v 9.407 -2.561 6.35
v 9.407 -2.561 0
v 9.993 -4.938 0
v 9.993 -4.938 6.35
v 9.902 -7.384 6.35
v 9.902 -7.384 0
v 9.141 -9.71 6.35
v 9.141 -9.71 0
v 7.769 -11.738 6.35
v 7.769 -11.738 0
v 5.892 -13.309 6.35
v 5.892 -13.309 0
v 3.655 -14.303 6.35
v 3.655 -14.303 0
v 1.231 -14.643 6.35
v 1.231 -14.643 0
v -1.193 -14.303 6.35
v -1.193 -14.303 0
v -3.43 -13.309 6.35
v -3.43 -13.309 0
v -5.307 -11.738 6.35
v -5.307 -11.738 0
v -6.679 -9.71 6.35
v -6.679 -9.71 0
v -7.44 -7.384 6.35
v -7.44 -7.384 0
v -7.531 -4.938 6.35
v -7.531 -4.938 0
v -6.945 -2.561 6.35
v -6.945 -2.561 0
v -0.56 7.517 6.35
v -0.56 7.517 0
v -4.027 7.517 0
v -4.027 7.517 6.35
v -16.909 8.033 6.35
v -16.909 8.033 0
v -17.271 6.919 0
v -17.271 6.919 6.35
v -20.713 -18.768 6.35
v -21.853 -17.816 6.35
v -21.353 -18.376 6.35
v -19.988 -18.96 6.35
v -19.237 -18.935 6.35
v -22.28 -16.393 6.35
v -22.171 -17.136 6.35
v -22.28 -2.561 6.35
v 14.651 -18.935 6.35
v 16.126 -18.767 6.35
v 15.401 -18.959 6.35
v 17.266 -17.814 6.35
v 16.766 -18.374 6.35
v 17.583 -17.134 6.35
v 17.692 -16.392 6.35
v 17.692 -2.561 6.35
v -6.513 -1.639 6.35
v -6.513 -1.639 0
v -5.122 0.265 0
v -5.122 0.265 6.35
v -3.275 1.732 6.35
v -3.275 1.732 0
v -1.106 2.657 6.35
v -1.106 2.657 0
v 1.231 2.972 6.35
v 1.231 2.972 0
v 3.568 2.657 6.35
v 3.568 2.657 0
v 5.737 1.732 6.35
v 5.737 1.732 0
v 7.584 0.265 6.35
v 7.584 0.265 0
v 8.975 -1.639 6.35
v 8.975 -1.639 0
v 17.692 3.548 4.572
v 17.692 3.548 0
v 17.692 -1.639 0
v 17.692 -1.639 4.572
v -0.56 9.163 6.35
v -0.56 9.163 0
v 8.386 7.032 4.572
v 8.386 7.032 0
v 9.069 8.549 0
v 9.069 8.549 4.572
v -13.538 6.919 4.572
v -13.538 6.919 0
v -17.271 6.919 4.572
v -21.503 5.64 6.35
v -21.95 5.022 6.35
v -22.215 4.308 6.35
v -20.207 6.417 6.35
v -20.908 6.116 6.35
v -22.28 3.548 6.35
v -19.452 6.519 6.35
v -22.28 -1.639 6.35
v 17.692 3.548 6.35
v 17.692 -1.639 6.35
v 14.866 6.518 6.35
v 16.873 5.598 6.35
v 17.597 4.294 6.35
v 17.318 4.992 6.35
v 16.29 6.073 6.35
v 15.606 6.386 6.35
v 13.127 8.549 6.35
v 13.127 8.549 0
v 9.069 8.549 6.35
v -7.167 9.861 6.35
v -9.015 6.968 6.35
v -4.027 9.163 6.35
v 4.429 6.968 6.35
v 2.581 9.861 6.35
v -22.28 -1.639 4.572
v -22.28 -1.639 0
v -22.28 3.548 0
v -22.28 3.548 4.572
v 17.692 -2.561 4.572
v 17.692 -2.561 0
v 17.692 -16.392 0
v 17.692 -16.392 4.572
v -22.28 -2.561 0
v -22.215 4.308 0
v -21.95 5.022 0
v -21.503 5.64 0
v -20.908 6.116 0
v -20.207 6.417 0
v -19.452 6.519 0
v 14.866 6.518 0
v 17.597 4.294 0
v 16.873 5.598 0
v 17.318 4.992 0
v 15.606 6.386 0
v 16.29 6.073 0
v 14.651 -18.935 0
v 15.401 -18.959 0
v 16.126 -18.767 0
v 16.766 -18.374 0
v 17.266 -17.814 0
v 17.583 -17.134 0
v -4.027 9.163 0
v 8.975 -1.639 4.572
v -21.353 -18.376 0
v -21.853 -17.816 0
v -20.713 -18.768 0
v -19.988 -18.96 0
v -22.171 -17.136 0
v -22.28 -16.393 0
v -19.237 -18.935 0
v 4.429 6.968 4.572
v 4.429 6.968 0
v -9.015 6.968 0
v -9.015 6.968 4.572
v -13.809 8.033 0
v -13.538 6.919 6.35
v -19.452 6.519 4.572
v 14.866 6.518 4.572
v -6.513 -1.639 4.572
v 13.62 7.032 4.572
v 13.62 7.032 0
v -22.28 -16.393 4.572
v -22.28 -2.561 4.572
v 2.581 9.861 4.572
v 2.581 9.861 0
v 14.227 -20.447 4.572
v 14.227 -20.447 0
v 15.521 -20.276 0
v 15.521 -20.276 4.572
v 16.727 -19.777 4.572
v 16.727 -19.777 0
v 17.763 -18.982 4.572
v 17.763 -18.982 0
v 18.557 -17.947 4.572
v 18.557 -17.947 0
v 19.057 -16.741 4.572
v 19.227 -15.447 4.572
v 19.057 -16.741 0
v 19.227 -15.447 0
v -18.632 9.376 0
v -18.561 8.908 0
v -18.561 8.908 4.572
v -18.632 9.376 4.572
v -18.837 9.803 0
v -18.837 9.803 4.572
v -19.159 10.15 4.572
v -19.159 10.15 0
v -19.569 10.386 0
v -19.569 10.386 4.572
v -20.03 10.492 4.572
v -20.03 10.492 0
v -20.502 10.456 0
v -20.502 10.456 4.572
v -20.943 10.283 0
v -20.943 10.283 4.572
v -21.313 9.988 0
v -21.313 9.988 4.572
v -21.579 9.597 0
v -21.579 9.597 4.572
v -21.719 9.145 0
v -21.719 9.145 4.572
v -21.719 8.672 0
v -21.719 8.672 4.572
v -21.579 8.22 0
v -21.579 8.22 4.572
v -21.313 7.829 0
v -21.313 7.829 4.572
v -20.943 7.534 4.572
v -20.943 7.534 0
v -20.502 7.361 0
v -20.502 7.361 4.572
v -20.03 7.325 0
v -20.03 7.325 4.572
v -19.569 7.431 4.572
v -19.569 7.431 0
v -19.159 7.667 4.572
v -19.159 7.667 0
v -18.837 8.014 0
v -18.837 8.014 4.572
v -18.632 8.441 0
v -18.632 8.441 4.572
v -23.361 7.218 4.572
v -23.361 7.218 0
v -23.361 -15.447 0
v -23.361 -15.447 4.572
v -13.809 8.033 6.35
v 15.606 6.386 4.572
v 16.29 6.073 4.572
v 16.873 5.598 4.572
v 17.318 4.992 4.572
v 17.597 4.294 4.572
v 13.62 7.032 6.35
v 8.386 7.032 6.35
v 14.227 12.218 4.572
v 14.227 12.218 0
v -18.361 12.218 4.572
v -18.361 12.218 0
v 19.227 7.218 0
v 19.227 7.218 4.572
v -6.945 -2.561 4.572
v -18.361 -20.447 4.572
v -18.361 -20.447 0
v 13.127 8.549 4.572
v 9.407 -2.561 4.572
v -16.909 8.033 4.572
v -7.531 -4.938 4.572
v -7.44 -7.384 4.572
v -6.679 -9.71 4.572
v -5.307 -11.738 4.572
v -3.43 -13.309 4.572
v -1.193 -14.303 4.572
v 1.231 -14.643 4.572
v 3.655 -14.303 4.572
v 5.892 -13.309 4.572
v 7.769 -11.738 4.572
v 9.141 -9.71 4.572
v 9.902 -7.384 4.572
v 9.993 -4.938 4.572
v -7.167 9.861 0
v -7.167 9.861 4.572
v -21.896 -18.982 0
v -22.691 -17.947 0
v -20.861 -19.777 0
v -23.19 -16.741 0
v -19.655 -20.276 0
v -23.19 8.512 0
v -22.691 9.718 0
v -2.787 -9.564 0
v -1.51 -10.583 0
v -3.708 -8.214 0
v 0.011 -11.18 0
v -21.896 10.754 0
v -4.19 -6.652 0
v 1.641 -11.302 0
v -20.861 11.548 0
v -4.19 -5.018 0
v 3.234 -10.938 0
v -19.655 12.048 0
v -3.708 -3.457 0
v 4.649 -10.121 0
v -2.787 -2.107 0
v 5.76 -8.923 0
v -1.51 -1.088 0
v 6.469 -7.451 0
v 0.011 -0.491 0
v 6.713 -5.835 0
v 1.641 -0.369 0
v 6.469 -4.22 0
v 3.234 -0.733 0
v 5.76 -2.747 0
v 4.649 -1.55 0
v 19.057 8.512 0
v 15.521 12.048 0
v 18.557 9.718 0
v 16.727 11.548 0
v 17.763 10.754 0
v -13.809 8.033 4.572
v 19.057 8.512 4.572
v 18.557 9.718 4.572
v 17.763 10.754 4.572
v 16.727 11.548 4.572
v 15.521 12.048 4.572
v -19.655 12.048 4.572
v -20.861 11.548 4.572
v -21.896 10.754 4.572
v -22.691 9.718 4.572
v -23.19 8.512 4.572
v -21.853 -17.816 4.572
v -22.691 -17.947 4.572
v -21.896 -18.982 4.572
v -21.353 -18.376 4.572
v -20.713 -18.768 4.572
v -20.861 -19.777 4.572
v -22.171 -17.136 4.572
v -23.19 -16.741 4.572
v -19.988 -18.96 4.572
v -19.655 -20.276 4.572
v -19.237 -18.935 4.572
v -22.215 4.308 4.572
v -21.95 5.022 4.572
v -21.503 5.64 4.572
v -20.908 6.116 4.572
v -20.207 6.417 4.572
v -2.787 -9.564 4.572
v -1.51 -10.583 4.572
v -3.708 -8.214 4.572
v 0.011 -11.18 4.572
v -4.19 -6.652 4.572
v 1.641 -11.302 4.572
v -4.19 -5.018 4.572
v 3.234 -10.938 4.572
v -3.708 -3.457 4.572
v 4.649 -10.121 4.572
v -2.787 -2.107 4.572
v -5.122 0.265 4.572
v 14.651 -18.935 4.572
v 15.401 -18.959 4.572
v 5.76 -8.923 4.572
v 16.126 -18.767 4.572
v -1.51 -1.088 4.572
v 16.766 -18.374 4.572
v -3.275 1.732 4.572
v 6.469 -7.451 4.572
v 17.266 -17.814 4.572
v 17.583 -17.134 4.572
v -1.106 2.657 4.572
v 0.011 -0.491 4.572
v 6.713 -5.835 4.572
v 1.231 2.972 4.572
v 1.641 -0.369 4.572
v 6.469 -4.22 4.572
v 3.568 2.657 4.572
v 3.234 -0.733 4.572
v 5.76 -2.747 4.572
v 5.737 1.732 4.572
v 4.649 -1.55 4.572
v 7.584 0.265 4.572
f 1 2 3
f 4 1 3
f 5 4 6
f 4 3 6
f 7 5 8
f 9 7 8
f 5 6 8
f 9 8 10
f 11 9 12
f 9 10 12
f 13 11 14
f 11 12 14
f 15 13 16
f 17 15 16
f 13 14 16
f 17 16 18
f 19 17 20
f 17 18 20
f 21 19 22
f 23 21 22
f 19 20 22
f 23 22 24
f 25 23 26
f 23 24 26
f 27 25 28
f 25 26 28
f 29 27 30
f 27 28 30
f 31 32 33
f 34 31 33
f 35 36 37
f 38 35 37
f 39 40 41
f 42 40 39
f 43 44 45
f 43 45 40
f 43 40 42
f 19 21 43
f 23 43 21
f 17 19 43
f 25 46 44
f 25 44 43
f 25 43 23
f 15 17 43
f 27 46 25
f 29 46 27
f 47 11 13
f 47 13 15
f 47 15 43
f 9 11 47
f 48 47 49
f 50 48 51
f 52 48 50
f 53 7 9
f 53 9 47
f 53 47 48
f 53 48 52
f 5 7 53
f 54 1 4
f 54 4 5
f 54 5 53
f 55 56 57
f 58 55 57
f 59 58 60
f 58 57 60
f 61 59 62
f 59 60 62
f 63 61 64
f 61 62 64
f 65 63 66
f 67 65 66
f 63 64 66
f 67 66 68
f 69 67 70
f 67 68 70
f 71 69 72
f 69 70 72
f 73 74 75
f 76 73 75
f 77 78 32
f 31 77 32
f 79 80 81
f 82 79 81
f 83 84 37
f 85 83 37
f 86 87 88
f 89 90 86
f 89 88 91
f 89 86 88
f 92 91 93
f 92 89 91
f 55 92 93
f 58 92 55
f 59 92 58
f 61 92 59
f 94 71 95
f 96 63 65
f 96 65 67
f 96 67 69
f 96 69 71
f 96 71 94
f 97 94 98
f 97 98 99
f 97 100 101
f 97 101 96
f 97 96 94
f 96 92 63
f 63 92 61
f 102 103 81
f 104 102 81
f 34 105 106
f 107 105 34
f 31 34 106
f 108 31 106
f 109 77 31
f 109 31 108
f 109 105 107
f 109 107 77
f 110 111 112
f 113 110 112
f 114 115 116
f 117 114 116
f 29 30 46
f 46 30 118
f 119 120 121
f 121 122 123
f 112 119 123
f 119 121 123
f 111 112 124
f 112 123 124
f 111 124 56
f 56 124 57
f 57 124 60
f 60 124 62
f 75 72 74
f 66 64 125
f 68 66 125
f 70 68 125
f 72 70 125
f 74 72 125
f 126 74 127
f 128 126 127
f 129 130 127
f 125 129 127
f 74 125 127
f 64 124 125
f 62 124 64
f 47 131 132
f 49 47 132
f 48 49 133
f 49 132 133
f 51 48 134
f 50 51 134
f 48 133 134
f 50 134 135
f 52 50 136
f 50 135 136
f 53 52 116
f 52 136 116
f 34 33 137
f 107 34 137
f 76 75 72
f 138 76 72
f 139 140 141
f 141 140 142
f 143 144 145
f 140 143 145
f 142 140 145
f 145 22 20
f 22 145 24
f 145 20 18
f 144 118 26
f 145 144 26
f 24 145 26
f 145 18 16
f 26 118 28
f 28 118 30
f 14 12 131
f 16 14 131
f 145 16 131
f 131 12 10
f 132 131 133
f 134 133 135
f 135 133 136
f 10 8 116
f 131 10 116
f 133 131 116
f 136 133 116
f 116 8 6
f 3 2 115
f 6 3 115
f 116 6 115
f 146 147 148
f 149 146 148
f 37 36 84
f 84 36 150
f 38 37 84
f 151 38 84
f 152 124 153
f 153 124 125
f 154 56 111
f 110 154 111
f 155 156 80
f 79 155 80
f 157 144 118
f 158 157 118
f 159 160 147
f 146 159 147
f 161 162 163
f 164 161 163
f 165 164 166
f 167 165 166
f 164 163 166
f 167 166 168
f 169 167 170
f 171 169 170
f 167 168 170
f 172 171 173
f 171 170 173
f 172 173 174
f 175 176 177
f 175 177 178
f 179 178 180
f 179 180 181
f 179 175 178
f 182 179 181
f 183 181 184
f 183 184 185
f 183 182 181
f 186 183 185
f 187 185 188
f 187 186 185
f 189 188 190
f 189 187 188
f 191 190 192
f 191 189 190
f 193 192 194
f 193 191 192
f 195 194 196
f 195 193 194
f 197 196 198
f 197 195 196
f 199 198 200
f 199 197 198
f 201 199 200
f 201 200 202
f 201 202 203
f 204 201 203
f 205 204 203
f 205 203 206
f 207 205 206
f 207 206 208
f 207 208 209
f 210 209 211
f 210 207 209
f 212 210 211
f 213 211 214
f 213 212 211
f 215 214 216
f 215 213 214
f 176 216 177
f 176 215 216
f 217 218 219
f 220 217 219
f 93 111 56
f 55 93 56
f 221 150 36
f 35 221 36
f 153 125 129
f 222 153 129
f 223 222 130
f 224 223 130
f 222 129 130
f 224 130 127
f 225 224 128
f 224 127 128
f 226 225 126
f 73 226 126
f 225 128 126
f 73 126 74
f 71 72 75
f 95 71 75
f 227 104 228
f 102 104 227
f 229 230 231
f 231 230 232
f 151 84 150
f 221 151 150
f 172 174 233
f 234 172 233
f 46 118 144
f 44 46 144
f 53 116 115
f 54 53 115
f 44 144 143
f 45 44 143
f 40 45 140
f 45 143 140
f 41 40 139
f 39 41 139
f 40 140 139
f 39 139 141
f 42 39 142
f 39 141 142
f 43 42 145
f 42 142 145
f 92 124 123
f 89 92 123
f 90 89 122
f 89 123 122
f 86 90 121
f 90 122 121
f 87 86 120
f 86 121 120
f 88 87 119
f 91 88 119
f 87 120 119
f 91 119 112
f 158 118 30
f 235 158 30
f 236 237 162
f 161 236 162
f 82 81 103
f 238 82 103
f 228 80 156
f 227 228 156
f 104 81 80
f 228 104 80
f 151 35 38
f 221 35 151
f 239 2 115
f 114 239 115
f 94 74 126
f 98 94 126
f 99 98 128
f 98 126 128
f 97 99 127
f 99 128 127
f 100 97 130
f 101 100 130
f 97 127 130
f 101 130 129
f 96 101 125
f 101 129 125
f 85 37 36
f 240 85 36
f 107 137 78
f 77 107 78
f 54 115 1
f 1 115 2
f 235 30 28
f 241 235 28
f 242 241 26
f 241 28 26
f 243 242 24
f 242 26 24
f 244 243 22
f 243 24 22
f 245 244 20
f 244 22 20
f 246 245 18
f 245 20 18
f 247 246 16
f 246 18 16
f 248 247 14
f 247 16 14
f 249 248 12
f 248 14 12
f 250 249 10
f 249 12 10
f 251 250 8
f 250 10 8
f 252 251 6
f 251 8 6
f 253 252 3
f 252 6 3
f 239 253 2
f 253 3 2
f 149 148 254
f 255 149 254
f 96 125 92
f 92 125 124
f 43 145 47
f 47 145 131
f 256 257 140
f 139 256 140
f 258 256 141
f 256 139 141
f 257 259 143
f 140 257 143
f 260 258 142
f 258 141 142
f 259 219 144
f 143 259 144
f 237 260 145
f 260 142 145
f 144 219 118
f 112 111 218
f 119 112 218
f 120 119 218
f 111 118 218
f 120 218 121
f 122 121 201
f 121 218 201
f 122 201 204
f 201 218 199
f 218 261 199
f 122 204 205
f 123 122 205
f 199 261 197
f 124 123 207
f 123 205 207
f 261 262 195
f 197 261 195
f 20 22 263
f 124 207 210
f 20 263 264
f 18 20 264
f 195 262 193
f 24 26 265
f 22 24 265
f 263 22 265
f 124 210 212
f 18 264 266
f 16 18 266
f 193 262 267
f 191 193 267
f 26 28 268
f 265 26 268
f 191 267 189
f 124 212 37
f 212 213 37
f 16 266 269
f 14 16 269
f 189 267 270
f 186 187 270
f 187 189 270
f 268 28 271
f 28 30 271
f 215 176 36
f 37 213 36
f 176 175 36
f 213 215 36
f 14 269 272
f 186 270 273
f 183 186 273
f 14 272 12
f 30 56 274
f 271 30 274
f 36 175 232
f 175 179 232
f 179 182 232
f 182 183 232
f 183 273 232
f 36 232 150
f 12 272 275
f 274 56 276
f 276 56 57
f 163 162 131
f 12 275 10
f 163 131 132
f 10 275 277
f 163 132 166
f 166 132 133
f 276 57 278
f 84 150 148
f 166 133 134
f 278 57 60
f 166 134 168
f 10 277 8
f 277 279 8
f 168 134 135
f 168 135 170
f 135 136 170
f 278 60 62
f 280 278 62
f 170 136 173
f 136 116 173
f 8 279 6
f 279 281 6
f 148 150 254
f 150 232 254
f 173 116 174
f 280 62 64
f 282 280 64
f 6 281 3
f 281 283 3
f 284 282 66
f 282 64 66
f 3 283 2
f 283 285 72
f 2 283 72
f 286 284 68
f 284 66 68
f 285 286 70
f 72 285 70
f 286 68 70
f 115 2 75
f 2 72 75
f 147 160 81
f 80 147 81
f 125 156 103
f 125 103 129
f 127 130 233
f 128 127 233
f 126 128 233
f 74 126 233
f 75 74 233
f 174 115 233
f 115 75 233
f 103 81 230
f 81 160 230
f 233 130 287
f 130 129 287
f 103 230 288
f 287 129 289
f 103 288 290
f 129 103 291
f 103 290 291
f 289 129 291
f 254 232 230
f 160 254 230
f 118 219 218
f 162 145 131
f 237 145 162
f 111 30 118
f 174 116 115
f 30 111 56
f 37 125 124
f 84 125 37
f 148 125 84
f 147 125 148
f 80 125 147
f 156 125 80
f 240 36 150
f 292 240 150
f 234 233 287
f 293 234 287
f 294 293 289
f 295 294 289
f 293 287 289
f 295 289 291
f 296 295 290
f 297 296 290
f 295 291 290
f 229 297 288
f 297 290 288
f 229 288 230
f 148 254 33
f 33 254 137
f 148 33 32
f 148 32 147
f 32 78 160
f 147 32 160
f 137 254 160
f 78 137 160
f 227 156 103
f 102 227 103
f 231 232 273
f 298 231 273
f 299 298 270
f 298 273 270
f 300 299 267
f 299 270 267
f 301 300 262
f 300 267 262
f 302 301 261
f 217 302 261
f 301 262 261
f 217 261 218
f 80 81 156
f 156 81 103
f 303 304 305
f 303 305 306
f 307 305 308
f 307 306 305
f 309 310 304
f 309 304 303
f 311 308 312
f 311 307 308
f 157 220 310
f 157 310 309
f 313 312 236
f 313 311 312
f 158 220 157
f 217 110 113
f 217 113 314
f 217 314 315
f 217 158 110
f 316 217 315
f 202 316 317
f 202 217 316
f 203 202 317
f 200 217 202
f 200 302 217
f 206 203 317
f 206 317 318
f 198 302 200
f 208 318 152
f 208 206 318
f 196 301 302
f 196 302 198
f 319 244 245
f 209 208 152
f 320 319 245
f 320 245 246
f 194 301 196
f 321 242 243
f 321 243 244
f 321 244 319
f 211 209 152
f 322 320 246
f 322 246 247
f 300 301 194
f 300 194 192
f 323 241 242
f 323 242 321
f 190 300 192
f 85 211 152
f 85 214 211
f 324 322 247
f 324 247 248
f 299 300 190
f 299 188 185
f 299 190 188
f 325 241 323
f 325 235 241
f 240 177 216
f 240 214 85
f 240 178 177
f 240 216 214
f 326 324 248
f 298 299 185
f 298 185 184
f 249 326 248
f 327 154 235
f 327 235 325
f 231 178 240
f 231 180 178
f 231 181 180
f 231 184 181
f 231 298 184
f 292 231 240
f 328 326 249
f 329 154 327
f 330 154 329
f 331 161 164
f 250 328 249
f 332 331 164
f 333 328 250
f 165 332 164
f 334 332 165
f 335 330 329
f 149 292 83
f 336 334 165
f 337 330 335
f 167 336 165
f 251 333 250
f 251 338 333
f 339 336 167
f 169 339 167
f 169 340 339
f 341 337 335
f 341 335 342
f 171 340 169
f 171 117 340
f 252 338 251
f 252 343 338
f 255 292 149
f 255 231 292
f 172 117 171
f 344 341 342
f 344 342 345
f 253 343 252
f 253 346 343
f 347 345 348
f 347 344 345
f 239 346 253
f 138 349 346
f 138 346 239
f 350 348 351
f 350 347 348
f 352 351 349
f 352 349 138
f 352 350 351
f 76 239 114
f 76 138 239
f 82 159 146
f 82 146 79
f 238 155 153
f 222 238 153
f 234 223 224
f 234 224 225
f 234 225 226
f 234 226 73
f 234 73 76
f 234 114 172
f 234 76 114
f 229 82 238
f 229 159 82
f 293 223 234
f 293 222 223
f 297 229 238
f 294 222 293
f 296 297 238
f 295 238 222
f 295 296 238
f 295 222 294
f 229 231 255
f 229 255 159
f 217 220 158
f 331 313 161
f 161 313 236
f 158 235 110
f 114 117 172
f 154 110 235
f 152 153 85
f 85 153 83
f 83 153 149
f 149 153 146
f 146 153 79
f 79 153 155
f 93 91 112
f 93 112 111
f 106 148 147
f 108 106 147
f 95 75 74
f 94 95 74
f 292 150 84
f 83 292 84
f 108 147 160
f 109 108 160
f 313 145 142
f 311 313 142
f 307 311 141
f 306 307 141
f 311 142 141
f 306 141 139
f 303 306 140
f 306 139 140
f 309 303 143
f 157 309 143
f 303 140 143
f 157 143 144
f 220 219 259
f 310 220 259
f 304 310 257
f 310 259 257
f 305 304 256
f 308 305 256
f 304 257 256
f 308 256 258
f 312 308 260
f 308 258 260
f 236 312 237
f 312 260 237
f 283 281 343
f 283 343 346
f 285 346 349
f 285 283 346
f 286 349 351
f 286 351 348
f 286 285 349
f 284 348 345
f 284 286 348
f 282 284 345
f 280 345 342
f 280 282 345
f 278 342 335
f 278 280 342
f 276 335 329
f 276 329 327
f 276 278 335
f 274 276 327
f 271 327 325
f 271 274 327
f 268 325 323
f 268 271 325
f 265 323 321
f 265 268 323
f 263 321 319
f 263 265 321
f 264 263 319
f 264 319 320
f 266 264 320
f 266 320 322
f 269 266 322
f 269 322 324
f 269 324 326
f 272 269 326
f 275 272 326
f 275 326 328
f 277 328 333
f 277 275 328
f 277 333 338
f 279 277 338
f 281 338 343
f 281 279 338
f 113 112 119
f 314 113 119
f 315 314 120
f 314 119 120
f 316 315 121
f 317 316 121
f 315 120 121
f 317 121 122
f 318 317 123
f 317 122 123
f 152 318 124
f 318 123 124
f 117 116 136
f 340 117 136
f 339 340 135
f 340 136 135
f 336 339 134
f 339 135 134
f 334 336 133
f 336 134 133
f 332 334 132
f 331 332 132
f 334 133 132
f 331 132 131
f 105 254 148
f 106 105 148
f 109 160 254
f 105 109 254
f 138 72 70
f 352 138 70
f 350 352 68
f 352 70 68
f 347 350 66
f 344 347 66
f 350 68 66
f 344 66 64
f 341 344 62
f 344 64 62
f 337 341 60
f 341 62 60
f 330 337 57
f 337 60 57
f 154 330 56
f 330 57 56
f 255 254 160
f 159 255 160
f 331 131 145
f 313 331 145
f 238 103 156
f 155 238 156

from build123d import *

# Parameters (mm, degrees)
F1_DEPTH = 6.35
F0_R     = 5.481735544
F0_R_2   = 1.5875
F2_DEPTH = 4.572


# Not quite as in the source:
# - ends of sketch curves that miss each other by under 0.0002 mm in the source are joined


with BuildPart() as f1:
    # F0 (on Top) → F1 (new body)
    with BuildSketch(Plane.XY):
        with BuildLine():
            ThreePointArc((-19.4521045311, 6.5193053193), (-21.5031469057, 5.6399822857), (-22.2801735623, 3.5480421826))
            Line((-22.2801735623, 3.5480421826), (-22.2801735623, -1.6389441203))
            Line((-22.2801735623, -1.6389441203), (-6.5127791505, -1.6389441203))
            ThreePointArc((-6.5127791505, -1.6389441203), (1.2310059125, 2.972369205), (8.9747909756, -1.6389441203))
            Line((8.9747909756, -1.6389441203), (17.6922247706, -1.6389441203))
            Line((17.6922247706, -1.6389441203), (17.6922247706, 3.5480415082))
            ThreePointArc((17.6922247706, 3.5480415082), (16.8726231039, 5.5978906933), (14.8656907599, 6.5175923519))
            Line((14.8656907599, 6.5175923519), (-19.4521045311, 6.5193053193))
        make_face()
    extrude(amount=F1_DEPTH)


with BuildPart() as f1b:
    # F0 (on Top) → F1, piece 2 (new body)
    with BuildSketch(Plane.XY):
        with BuildLine():
            Line((-22.2801735623, -2.5610408197), (-22.2801735623, -16.3933522999))
            ThreePointArc((-22.2801735623, -16.3933522999), (-21.3530783029, -18.375721012), (-19.2373136057, -18.9350340515))
            Line((-19.2373136057, -18.9350340515), (-2.2932069786, -18.9350340515))
            Line((-2.2932069786, -18.9350340515), (14.6508998345, -18.9350340515))
            ThreePointArc((14.6508998345, -18.9350340515), (16.7658482764, -18.3739688541), (17.6922247706, -16.3916400069))
            Line((17.6922247706, -16.3916400069), (17.6922247706, -2.5610408197))
            Line((17.6922247706, -2.5610408197), (9.4074936158, -2.5610408197))
            ThreePointArc((9.4074936158, -2.5610408197), (1.2310059125, -14.6430934532), (-6.9454817907, -2.5610408197))
            Line((-6.9454817907, -2.5610408197), (-22.2801735623, -2.5610408197))
        make_face()
    extrude(amount=F1_DEPTH)


with BuildPart() as f1c:
    # F0 (on Top) → F1, piece 3 (new body)
    with BuildSketch(Plane.XY):
        Polygon((2.5806244571, 9.8610082641), (-2.2932067925, 9.8610082641), (-7.1670380421, 9.8610082641), (-9.0154232457, 6.9678835571), (-2.2932067925, 6.9678835571), (4.4290096607, 6.9678835571), align=None)
        Polygon((-4.0268255398, 9.1632921249), (-2.2932067925, 9.1632921249), (-0.5595880453, 9.1632921249), (-0.5595880453, 7.516568061), (-2.2932067925, 7.516568061), (-4.0268255398, 7.516568061), align=None, mode=Mode.SUBTRACT)
    extrude(amount=F1_DEPTH)


with BuildPart() as f1d:
    # F0 (on Top) → F1, piece 4 (new body)
    with BuildSketch(Plane.XY):
        Polygon((-13.8089191169, 8.0332169309), (-16.9094987214, 8.0332169309), (-17.2707308084, 6.919416599), (-16.5636505928, 6.919416599), (-14.1506345941, 6.919416599), (-13.5379955173, 6.919416599), align=None)
    extrude(amount=F1_DEPTH)


with BuildPart() as f1e:
    # F0 (on Top) → F1, piece 5 (new body)
    with BuildSketch(Plane.XY):
        Polygon((9.0685896575, 8.5486769676), (8.3859022707, 7.0315953344), (9.4382846728, 7.0315953344), (12.5052956864, 7.0315953344), (13.6198326945, 7.0315953344), (13.1267812103, 8.5486769676), align=None)
    extrude(amount=F1_DEPTH)


with BuildPart() as f2:
    # F0 (on Top) → F2 (new body)
    with BuildSketch(Plane.XY):
        with BuildLine():
            Line((14.2269962281, 12.2182751074), (-18.3607199043, 12.2182751074))
            ThreePointArc((-18.3607199043, 12.2182751074), (-21.8962538102, 10.7538090134), (-23.3607199043, 7.2182751074))
            Line((-23.3607199043, 7.2182751074), (-23.3607199043, -15.4466097057))
            ThreePointArc((-23.3607199043, -15.4466097057), (-21.8962538102, -18.9821436116), (-18.3607199043, -20.4466097057))
            Line((-18.3607199043, -20.4466097057), (14.2269962281, -20.4466097057))
            ThreePointArc((14.2269962281, -20.4466097057), (17.762530134, -18.9821436116), (19.2269962281, -15.4466097057))
            Line((19.2269962281, -15.4466097057), (19.2269962281, 7.2182751074))
            ThreePointArc((19.2269962281, 7.2182751074), (17.762530134, 10.7538090134), (14.2269962281, 12.2182751074))
        make_face()
        with BuildLine():
            ThreePointArc((-19.2373136057, -18.9350340515), (-21.3530783029, -18.375721012), (-22.2801735623, -16.3933522999))
            Line((-22.2801735623, -16.3933522999), (-22.2801735623, -2.5610408197))
            Line((-22.2801735623, -2.5610408197), (-6.9454817907, -2.5610408197))
            ThreePointArc((-6.9454817907, -2.5610408197), (1.2310059125, -14.6430934532), (9.4074936158, -2.5610408197))
            Line((9.4074936158, -2.5610408197), (17.6922247706, -2.5610408197))
            Line((17.6922247706, -2.5610408197), (17.6922247706, -16.3916400069))
            ThreePointArc((17.6922247706, -16.3916400069), (16.7658482764, -18.3739688541), (14.6508998345, -18.9350340515))
            Line((14.6508998345, -18.9350340515), (-2.2932067925, -18.9350340515))
            Line((-2.2932067925, -18.9350340515), (-19.2373136057, -18.9350340515))
        make_face(mode=Mode.SUBTRACT)
        with Locations((1.2310059125, -5.8353621241)):
            Circle(F0_R, mode=Mode.SUBTRACT)
        with BuildLine():
            Line((-22.2801735623, -1.6389441203), (-22.2801735623, 3.5480421826))
            ThreePointArc((-22.2801735623, 3.5480421826), (-21.5031469057, 5.6399822857), (-19.4521045311, 6.5193053193))
            Line((-19.4521045311, 6.5193053193), (14.8656907599, 6.5175923519))
            ThreePointArc((14.8656907599, 6.5175923519), (16.8726231039, 5.5978906933), (17.6922247706, 3.5480415082))
            Line((17.6922247706, 3.5480415082), (17.6922247706, -1.6389441203))
            Line((17.6922247706, -1.6389441203), (8.9747909756, -1.6389441203))
            ThreePointArc((8.9747909756, -1.6389441203), (1.2310059125, 2.972369205), (-6.5127791505, -1.6389441203))
            Line((-6.5127791505, -1.6389441203), (-22.2801735623, -1.6389441203))
        make_face(mode=Mode.SUBTRACT)
        Polygon((-17.2707308084, 6.919416599), (-16.9094987214, 8.0332169309), (-13.8089191169, 8.0332169309), (-13.5379955173, 6.919416599), (-14.1506345941, 6.919416599), (-16.5636505928, 6.919416599), align=None, mode=Mode.SUBTRACT)
        with Locations((-20.1489608735, 8.9084757492)):
            Circle(F0_R_2, mode=Mode.SUBTRACT)
        Polygon((-7.1670380421, 9.8610082641), (-2.2932067925, 9.8610082641), (2.5806244571, 9.8610082641), (4.4290096607, 6.9678835571), (-2.2932067925, 6.9678835571), (-9.0154232457, 6.9678835571), align=None, mode=Mode.SUBTRACT)
        Polygon((9.4382846728, 7.0315953344), (8.3859022707, 7.0315953344), (9.0685896575, 8.5486769676), (13.1267812103, 8.5486769676), (13.6198326945, 7.0315953344), (12.5052956864, 7.0315953344), align=None, mode=Mode.SUBTRACT)
    extrude(amount=F2_DEPTH)


solid = Compound([f1.part, f1b.part, f1c.part, f1d.part, f1e.part, f2.part])
